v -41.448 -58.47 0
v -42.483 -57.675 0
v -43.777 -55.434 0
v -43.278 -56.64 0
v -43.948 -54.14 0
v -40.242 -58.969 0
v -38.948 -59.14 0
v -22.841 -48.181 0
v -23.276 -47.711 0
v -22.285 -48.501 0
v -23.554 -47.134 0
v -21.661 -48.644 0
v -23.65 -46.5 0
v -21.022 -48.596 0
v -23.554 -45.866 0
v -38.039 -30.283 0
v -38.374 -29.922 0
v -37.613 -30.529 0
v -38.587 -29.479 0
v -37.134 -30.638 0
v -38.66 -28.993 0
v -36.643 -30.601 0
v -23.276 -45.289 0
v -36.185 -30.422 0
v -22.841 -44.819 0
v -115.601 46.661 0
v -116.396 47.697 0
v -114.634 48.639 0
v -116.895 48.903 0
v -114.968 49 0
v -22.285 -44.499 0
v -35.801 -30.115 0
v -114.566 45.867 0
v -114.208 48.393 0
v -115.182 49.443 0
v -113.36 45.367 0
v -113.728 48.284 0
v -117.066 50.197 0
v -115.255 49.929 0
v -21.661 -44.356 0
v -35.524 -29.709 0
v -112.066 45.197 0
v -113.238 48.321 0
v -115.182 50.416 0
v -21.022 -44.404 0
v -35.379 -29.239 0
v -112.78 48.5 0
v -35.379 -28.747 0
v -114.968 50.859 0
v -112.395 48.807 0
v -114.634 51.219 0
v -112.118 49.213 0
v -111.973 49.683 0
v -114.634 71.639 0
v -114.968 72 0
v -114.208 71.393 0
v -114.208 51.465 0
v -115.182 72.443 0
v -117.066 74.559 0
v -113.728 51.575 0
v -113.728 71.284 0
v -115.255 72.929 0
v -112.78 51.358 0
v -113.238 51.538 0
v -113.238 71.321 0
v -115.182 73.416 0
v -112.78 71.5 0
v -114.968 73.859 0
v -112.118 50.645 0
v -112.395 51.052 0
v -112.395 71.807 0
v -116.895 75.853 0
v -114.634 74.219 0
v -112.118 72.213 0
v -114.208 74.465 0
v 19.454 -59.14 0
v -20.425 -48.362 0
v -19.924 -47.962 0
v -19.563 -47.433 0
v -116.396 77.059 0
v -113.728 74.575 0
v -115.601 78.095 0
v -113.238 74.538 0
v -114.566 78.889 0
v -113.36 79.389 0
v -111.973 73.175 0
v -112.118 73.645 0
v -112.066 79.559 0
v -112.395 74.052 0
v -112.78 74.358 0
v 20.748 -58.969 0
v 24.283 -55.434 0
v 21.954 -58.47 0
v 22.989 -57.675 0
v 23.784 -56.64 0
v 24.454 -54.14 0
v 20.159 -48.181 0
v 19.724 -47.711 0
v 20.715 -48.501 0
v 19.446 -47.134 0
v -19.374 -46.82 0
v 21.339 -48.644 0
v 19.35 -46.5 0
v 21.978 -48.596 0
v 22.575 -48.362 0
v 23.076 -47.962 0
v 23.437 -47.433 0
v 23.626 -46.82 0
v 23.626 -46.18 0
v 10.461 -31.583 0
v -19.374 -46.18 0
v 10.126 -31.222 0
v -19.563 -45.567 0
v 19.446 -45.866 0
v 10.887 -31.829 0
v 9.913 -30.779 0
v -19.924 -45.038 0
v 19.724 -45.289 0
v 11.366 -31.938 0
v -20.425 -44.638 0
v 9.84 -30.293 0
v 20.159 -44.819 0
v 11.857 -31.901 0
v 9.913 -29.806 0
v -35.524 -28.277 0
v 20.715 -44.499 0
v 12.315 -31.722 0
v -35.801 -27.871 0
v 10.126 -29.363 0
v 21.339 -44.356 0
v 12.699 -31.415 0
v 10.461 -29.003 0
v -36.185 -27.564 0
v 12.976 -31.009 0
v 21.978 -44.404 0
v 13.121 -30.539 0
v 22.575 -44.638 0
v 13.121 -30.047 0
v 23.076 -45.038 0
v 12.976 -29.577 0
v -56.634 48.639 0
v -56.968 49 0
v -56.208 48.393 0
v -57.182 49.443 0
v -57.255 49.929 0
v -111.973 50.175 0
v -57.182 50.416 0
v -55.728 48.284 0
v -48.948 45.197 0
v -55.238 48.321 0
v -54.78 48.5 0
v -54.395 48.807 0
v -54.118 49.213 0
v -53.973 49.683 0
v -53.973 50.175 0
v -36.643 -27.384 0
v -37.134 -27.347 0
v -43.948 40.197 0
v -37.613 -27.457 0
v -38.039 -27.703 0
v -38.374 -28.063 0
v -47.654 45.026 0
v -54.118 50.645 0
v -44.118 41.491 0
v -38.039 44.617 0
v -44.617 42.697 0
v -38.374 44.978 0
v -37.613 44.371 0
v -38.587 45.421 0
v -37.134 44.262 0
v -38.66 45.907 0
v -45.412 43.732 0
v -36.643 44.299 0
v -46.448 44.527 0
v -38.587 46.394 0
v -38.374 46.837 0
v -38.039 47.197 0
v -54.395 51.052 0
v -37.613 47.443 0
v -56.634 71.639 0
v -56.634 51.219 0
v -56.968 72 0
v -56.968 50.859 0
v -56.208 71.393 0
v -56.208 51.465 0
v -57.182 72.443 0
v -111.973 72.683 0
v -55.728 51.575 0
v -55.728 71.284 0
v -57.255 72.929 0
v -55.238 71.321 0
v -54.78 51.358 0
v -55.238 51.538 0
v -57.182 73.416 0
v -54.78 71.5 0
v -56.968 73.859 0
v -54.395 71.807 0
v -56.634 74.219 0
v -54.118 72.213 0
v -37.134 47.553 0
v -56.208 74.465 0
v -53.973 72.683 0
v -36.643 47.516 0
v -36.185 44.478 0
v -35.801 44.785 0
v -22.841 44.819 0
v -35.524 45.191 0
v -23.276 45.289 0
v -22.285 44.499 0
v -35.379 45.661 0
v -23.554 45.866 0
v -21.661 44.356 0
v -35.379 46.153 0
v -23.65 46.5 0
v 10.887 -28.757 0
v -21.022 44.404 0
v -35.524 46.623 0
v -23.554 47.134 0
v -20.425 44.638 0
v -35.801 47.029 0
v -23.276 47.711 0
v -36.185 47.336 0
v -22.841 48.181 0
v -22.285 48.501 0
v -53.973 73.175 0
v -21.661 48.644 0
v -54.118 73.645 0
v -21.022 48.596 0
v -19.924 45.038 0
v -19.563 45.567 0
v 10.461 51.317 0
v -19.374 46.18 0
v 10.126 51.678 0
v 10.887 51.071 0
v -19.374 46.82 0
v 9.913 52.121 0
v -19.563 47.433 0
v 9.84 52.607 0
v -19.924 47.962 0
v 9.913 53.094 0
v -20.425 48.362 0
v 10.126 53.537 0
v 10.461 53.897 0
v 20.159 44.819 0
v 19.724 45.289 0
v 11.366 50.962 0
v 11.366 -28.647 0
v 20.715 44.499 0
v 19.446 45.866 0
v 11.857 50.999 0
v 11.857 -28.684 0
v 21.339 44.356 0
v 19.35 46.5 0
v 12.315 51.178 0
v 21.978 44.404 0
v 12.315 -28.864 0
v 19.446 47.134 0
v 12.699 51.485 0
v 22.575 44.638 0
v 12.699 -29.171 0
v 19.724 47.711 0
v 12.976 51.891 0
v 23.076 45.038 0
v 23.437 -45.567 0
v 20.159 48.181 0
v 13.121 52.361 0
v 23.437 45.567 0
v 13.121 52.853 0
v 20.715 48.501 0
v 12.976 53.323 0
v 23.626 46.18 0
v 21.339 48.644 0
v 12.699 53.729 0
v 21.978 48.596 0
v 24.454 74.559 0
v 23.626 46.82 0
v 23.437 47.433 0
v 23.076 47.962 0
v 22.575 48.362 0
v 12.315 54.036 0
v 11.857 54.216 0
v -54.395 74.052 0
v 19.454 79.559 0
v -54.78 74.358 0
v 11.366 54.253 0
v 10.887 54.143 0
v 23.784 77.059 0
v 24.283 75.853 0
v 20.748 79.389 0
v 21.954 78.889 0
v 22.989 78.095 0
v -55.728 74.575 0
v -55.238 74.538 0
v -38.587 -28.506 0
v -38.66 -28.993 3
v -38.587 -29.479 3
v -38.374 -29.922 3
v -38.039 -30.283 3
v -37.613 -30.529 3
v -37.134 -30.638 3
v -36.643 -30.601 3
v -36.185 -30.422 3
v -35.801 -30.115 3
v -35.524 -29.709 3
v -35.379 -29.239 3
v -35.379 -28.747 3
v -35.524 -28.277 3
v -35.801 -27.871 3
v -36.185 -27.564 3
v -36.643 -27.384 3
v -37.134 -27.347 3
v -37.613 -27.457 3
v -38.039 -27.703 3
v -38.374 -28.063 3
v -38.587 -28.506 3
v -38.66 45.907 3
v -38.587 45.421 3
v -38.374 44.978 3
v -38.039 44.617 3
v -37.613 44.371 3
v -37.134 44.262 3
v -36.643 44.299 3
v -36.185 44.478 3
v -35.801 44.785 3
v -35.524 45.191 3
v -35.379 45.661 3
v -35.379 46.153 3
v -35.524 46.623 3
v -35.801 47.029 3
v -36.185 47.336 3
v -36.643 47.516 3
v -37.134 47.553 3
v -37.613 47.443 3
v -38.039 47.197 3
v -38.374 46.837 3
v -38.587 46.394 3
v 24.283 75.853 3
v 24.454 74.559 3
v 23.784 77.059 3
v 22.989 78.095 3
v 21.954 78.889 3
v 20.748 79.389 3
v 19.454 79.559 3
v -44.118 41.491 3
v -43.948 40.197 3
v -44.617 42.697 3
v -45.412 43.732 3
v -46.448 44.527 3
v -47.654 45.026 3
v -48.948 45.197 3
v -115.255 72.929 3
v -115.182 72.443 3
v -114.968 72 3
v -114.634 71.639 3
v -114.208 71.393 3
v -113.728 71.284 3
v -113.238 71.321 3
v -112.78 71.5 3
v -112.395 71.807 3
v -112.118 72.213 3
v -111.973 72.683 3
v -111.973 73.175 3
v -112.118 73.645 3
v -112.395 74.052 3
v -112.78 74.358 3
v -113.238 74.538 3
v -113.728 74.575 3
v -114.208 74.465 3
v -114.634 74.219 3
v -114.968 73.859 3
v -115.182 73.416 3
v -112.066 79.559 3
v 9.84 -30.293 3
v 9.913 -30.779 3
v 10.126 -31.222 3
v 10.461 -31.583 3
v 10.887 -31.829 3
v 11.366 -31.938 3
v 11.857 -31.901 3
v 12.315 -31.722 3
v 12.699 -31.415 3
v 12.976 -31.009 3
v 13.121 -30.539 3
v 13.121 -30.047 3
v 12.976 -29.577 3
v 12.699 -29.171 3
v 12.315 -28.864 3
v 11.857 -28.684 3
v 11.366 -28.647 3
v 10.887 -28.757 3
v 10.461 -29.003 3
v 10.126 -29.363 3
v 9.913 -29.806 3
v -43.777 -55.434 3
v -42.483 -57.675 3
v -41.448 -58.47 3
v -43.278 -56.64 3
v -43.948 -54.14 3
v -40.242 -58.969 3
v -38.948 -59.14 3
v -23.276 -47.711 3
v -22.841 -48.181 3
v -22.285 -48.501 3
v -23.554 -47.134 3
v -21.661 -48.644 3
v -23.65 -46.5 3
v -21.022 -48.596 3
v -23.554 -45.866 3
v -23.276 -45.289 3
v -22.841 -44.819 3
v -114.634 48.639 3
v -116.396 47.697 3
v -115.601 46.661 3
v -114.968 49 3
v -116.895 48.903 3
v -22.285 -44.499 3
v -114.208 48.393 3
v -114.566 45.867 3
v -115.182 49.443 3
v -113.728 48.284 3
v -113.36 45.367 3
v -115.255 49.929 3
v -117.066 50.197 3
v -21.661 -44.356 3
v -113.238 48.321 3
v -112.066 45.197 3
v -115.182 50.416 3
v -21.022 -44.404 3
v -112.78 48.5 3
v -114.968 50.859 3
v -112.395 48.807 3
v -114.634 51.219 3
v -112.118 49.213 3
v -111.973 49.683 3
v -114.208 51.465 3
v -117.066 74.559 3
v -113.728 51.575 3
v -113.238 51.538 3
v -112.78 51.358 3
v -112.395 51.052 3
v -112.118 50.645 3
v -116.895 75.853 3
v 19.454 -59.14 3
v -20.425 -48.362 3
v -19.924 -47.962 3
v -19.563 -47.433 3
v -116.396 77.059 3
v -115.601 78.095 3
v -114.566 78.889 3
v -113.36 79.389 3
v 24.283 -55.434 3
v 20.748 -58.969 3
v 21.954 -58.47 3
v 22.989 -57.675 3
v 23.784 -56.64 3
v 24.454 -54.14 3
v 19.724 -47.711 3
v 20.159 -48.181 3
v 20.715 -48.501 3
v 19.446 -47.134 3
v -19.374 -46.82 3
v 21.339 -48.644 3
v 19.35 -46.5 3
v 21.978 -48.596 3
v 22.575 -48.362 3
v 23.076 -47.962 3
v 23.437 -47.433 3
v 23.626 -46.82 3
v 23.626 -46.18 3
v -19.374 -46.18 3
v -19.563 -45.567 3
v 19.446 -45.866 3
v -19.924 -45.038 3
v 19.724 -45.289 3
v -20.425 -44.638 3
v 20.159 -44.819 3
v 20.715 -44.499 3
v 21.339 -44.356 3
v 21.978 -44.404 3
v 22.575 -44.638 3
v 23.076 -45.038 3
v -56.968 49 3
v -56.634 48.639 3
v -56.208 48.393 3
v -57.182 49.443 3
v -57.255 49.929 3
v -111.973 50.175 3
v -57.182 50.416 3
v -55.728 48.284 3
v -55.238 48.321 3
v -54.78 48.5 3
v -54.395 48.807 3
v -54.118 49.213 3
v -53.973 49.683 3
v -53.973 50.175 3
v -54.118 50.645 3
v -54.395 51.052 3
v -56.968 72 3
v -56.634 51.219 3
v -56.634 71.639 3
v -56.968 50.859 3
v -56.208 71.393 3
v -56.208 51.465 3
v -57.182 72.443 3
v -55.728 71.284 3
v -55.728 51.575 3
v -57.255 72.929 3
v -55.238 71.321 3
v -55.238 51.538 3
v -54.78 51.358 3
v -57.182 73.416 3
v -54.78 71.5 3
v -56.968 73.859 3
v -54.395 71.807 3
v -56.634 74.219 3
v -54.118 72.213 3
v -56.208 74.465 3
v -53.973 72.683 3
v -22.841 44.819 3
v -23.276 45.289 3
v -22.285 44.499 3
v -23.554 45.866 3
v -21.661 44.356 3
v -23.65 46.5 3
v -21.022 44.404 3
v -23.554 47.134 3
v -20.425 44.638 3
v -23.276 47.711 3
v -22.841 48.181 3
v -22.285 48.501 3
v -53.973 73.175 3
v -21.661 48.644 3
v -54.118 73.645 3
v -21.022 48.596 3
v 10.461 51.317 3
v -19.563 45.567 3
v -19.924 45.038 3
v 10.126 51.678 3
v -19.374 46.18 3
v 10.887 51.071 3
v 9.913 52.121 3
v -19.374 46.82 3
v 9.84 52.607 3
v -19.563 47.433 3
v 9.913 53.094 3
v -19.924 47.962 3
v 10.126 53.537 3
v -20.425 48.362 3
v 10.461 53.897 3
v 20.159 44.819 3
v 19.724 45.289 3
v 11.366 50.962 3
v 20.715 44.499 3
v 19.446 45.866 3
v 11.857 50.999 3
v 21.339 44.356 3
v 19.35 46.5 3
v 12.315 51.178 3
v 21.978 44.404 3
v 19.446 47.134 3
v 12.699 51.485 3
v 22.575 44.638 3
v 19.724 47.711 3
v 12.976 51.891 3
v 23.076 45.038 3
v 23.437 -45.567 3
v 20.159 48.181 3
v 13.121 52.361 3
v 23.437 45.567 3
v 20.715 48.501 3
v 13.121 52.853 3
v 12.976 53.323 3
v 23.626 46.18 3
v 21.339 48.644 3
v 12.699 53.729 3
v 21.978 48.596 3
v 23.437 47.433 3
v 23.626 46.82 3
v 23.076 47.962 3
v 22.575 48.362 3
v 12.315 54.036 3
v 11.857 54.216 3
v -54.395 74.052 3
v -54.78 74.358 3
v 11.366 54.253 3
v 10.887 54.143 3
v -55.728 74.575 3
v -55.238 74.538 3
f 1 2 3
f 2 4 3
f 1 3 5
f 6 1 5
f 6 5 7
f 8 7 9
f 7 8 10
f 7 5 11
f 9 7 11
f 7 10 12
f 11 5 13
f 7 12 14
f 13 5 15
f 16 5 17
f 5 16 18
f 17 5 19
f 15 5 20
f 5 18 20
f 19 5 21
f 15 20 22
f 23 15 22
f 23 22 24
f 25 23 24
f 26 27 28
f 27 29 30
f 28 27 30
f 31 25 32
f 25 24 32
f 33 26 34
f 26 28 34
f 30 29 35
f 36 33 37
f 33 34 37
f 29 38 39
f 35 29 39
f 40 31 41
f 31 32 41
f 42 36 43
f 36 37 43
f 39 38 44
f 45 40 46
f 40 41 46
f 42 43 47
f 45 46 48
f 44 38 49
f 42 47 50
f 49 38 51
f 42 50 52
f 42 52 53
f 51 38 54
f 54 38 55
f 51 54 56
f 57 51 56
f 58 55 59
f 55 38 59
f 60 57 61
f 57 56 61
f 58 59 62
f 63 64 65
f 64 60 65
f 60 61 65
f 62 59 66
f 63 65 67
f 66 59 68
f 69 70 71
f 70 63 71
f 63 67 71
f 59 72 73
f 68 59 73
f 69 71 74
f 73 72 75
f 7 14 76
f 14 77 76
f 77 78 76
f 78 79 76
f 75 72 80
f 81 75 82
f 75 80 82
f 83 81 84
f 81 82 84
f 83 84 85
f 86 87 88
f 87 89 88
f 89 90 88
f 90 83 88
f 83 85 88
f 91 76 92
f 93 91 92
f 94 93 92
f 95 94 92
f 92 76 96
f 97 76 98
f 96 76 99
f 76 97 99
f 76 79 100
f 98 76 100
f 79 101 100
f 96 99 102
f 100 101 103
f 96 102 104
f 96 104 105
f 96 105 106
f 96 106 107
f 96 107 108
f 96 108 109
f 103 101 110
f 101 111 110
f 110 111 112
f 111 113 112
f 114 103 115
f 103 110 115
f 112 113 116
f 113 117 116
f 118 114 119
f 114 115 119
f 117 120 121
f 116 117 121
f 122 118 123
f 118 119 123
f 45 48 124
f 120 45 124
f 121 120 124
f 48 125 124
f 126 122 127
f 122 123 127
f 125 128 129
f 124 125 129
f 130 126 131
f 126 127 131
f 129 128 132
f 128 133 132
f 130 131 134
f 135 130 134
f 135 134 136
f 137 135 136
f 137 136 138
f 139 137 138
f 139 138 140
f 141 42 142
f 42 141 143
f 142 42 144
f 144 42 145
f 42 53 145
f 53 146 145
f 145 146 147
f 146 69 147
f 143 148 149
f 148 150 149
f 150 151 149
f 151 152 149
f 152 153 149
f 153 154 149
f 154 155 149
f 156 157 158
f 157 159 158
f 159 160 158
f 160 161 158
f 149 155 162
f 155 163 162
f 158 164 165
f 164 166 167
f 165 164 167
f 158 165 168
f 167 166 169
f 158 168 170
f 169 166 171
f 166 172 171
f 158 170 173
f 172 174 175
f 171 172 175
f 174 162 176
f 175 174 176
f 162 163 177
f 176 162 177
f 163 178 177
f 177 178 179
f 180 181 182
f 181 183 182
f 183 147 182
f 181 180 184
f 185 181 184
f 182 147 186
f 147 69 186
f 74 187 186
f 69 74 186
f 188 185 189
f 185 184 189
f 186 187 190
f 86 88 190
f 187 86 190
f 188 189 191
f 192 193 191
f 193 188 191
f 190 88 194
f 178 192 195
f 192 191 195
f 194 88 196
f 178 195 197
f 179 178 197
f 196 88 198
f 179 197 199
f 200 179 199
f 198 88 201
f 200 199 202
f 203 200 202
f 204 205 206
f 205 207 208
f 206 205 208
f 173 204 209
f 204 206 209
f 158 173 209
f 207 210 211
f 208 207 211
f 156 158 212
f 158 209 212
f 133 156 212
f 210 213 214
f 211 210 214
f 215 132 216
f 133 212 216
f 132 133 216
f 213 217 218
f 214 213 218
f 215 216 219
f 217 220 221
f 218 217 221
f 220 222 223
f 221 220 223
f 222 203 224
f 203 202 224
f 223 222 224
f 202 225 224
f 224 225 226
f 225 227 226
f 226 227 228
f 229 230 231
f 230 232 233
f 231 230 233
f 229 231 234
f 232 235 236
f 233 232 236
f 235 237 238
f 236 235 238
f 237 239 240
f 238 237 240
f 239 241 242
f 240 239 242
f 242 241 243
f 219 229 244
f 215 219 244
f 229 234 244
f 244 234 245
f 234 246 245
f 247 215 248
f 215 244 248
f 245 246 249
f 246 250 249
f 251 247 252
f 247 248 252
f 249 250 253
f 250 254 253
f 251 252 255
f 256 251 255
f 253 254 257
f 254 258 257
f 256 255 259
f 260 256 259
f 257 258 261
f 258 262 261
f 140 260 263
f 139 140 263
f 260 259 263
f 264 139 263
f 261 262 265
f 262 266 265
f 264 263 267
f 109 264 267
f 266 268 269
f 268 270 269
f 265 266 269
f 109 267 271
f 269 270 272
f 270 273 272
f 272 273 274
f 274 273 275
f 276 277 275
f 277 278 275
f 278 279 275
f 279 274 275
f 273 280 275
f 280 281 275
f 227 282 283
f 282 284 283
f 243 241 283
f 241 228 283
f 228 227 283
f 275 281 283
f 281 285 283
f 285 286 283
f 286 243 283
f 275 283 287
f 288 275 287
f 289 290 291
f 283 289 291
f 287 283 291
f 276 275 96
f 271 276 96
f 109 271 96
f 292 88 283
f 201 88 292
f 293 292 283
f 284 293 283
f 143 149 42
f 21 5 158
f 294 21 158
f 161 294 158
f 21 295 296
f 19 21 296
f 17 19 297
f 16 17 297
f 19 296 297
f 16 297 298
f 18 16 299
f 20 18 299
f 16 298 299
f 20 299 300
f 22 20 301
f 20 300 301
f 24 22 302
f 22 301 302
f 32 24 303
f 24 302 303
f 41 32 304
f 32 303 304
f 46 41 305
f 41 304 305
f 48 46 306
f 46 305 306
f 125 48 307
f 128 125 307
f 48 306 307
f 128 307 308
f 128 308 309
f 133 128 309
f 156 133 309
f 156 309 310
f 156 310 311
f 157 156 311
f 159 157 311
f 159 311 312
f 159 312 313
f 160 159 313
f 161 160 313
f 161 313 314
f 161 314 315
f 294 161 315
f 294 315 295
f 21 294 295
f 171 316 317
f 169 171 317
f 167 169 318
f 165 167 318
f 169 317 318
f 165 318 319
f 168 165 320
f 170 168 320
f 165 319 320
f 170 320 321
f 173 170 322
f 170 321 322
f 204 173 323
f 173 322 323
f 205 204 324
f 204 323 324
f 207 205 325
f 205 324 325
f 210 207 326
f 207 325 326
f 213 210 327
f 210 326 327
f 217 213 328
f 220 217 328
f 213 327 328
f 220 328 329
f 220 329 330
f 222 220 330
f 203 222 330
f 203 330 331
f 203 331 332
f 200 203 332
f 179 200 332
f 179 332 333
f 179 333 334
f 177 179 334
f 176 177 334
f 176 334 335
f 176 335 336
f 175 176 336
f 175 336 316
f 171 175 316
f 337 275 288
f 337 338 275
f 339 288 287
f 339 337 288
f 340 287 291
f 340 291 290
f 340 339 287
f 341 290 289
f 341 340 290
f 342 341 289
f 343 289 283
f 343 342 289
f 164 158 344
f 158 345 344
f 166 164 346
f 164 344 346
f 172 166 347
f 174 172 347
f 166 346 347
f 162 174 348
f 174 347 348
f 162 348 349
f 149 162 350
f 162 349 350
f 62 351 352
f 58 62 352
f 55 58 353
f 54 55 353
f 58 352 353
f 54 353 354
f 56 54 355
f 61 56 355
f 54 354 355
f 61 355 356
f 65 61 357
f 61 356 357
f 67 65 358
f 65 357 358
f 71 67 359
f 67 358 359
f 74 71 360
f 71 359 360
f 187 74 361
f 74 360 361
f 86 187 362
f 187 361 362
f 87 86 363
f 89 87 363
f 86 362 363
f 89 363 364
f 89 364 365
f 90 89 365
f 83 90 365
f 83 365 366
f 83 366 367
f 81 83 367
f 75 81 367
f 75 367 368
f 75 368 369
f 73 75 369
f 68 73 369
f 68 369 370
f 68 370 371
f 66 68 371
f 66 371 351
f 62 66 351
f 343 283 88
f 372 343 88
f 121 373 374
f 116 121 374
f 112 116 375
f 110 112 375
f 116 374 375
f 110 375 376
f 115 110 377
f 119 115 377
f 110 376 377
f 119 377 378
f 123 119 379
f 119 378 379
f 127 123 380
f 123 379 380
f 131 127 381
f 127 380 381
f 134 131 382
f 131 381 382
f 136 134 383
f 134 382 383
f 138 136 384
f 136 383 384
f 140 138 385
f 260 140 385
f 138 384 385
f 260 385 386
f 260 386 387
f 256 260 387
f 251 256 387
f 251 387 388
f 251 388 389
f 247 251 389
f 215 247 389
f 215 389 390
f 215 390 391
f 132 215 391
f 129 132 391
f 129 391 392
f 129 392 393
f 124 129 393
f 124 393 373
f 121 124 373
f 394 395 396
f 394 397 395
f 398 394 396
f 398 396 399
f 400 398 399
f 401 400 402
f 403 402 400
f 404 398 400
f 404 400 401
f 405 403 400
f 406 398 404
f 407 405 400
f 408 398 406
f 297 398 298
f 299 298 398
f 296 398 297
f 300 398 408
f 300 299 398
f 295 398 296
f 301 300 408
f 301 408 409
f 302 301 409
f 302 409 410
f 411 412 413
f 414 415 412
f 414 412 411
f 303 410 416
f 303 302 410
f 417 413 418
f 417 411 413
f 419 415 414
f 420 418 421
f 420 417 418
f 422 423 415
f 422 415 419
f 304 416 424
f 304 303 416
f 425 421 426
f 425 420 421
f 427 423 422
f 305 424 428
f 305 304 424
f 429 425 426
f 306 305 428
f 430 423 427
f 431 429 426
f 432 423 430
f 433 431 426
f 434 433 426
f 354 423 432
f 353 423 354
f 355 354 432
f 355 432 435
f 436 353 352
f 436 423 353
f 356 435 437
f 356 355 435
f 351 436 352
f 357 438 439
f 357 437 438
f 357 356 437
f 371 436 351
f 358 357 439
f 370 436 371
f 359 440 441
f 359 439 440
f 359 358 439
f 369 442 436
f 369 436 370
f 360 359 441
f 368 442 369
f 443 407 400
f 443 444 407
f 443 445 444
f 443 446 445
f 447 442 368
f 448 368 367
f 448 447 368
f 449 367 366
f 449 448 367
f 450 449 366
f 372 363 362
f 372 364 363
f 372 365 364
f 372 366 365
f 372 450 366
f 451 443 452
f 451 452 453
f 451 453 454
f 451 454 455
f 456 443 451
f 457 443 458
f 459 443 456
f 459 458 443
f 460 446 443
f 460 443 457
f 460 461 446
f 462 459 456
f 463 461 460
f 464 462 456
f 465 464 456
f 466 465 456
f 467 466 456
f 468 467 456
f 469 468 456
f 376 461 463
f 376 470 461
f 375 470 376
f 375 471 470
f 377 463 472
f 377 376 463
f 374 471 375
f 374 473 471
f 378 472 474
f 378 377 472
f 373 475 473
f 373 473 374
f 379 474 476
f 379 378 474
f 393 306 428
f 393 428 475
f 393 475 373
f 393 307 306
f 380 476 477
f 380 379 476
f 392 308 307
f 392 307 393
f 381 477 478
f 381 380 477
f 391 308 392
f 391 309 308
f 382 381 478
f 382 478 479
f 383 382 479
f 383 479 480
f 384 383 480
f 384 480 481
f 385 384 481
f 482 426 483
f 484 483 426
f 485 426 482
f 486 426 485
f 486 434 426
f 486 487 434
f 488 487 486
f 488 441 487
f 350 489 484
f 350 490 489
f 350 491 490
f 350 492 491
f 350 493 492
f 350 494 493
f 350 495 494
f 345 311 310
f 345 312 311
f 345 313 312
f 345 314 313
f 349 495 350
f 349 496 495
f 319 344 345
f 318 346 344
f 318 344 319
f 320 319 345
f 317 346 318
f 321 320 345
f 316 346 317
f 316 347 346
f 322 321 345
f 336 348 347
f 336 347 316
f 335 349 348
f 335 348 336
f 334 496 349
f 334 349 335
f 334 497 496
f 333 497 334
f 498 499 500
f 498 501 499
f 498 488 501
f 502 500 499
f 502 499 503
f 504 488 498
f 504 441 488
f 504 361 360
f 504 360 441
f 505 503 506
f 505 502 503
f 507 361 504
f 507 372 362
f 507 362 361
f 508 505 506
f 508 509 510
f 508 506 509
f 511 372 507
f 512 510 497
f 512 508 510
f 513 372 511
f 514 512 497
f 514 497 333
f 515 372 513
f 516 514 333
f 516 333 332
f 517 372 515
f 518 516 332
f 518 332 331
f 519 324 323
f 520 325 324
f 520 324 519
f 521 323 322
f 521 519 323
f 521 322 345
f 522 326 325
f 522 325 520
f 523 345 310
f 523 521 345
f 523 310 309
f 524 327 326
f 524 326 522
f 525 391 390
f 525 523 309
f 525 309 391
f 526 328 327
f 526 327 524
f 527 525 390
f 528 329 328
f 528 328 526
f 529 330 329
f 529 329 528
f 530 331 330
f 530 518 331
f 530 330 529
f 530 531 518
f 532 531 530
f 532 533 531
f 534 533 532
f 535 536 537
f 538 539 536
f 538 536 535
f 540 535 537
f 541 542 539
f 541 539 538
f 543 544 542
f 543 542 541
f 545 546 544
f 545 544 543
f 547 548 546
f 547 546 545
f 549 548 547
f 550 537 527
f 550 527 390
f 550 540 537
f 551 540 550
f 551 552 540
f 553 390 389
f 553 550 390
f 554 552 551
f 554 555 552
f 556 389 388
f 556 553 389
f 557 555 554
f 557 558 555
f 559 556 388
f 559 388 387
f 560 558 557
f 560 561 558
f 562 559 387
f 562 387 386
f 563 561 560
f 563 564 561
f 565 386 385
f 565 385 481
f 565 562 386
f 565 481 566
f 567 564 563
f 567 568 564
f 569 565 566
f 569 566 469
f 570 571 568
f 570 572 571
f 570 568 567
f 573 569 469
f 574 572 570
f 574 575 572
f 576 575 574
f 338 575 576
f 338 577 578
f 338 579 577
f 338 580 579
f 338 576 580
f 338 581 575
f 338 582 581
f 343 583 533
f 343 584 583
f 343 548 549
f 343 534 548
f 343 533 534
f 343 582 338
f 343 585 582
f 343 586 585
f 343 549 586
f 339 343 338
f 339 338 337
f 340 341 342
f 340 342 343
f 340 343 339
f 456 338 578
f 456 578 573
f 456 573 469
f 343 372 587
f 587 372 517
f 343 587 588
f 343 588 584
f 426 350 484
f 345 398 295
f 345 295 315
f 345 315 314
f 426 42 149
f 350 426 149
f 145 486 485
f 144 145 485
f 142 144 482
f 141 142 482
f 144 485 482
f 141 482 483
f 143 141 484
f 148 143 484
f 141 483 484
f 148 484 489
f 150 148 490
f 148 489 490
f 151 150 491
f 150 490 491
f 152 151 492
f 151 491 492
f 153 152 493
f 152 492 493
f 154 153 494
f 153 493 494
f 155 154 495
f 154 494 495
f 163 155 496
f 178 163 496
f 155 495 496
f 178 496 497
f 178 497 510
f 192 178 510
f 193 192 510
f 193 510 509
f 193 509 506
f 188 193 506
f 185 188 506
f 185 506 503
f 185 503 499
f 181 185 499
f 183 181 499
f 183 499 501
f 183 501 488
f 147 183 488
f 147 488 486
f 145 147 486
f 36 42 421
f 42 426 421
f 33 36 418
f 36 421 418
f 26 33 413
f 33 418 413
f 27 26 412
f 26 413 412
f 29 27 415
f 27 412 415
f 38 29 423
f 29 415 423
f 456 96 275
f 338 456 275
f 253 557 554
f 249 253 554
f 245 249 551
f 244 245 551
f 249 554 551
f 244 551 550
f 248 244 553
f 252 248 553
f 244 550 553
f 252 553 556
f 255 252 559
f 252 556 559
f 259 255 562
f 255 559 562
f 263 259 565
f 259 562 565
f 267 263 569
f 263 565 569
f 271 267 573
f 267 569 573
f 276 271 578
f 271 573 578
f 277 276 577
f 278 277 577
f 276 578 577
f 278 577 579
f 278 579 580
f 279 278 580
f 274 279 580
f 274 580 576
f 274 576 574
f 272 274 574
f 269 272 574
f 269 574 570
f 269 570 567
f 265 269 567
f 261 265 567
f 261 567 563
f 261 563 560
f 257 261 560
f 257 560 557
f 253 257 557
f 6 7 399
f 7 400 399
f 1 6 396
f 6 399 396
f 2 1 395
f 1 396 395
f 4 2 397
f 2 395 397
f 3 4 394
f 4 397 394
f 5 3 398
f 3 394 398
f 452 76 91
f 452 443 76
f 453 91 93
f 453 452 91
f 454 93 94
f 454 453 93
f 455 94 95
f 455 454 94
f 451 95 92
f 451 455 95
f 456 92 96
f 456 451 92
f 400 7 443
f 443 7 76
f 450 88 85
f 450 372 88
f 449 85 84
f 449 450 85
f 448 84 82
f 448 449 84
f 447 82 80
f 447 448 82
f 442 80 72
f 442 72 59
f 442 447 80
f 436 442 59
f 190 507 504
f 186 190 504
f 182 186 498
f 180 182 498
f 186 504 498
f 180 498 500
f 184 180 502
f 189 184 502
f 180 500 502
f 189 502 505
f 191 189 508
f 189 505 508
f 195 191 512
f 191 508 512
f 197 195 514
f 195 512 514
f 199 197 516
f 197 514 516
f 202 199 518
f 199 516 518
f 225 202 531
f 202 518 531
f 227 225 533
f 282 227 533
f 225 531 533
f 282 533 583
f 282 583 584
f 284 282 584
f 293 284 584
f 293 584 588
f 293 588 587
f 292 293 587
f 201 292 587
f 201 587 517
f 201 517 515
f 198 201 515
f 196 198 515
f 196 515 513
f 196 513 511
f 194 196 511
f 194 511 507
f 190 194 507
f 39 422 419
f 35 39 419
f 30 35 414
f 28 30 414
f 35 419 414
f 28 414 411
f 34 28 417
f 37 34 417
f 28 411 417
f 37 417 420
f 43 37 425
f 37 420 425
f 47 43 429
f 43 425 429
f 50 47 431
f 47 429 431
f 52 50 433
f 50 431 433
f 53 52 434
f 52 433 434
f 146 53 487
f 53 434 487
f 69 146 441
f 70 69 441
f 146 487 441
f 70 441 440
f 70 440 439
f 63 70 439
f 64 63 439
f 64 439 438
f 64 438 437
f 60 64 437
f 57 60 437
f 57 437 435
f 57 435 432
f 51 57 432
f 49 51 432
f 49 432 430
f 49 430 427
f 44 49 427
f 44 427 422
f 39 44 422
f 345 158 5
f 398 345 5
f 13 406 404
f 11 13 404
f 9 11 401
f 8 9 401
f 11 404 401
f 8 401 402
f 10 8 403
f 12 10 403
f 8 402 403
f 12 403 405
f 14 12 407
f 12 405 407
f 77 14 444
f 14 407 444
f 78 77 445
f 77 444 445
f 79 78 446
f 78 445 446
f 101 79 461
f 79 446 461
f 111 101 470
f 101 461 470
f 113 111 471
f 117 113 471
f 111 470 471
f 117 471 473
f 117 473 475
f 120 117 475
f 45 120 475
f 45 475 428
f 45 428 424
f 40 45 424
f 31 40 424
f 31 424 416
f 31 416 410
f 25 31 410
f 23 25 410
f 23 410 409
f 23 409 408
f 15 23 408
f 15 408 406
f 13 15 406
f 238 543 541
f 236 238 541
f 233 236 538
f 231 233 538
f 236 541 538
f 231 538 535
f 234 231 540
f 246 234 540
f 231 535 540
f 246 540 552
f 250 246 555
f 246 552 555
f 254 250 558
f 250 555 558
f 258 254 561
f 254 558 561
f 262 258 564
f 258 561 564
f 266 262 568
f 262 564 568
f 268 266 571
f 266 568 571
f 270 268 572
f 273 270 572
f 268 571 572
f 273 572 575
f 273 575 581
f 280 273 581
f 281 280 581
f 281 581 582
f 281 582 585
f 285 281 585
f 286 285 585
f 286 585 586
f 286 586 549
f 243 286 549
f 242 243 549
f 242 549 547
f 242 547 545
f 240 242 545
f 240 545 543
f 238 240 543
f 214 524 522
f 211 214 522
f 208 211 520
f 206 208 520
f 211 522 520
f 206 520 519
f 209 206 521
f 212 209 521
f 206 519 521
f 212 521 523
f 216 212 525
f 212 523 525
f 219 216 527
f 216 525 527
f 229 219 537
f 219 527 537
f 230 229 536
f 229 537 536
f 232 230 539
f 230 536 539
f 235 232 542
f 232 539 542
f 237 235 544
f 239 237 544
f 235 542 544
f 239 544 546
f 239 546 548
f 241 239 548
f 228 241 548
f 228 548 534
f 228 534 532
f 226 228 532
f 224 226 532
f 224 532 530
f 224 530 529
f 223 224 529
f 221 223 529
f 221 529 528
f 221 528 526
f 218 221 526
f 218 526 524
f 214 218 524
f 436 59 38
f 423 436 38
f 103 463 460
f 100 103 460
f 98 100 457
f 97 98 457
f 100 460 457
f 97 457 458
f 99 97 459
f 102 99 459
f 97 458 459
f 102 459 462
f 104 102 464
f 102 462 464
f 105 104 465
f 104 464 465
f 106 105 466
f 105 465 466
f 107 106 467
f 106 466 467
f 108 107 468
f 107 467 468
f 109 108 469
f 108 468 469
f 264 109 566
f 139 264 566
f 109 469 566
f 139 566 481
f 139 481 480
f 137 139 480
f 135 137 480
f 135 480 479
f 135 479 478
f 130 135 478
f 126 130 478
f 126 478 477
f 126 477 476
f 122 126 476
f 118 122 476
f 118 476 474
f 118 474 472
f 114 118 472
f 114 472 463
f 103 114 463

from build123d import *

# Parameters (mm, degrees)
F1_DEPTH = 3
F2_D     = 3.3
F3_D     = 4.3
F4_R     = 5


# Not quite as in the source:
# - a feature names something its author has since deleted; it is built from what else it names


with BuildPart() as f1:
    # F0 (on Top) → F1 (new body)
    with BuildSketch(Plane.XY):
        Polygon((-43.9476147294, -59.139739722), (24.4538411498, -59.139739722), (24.4538411498, 79.5589722693), (-117.0655786991, 79.5589722693), (-117.0655786991, 45.1967306435), (-43.9476147294, 45.1967306435), align=None)
    extrude(amount=F1_DEPTH)

    # F2 (through all)
    with Locations(Plane(origin=(0, 0, 0), x_dir=(1, 0, 0), z_dir=(0, 0, -1))):
        with Locations((-113.6049106717, -72.9293674231), (-113.6049106717, -49.9293674231), (-55.6049106717, -49.9293674231), (-55.6049106717, -72.9293674231), (-37.0104938323, -45.9071589798), (11.4895061677, -52.6071589798), (11.4895061677, 30.2928410202), (-37.0104938323, 28.9928410202)):
            Hole(F2_D / 2)

    # F3 (through all)
    with Locations(Plane(origin=(0, 0, 0), x_dir=(1, 0, 0), z_dir=(0, 0, -1))):
        with Locations((-21.5, -46.5), (21.5, -46.5), (21.5, 46.5), (-21.5, 46.5)):
            Hole(F3_D / 2)

    # F4
    f4_edges = [f1.edges().sort_by_distance(p)[0] for p in [
        (-117.065579, 79.558972, 1.5),
        (-43.947615, 45.196731, 1.5),
        (-117.065579, 45.196731, 1.5),
        (24.453841, 79.558972, 1.5),
        (24.453841, -59.13974, 1.5),
        (-43.947615, -59.13974, 1.5),
    ]]
    fillet(f4_edges, radius=F4_R)


solid = f1.part
